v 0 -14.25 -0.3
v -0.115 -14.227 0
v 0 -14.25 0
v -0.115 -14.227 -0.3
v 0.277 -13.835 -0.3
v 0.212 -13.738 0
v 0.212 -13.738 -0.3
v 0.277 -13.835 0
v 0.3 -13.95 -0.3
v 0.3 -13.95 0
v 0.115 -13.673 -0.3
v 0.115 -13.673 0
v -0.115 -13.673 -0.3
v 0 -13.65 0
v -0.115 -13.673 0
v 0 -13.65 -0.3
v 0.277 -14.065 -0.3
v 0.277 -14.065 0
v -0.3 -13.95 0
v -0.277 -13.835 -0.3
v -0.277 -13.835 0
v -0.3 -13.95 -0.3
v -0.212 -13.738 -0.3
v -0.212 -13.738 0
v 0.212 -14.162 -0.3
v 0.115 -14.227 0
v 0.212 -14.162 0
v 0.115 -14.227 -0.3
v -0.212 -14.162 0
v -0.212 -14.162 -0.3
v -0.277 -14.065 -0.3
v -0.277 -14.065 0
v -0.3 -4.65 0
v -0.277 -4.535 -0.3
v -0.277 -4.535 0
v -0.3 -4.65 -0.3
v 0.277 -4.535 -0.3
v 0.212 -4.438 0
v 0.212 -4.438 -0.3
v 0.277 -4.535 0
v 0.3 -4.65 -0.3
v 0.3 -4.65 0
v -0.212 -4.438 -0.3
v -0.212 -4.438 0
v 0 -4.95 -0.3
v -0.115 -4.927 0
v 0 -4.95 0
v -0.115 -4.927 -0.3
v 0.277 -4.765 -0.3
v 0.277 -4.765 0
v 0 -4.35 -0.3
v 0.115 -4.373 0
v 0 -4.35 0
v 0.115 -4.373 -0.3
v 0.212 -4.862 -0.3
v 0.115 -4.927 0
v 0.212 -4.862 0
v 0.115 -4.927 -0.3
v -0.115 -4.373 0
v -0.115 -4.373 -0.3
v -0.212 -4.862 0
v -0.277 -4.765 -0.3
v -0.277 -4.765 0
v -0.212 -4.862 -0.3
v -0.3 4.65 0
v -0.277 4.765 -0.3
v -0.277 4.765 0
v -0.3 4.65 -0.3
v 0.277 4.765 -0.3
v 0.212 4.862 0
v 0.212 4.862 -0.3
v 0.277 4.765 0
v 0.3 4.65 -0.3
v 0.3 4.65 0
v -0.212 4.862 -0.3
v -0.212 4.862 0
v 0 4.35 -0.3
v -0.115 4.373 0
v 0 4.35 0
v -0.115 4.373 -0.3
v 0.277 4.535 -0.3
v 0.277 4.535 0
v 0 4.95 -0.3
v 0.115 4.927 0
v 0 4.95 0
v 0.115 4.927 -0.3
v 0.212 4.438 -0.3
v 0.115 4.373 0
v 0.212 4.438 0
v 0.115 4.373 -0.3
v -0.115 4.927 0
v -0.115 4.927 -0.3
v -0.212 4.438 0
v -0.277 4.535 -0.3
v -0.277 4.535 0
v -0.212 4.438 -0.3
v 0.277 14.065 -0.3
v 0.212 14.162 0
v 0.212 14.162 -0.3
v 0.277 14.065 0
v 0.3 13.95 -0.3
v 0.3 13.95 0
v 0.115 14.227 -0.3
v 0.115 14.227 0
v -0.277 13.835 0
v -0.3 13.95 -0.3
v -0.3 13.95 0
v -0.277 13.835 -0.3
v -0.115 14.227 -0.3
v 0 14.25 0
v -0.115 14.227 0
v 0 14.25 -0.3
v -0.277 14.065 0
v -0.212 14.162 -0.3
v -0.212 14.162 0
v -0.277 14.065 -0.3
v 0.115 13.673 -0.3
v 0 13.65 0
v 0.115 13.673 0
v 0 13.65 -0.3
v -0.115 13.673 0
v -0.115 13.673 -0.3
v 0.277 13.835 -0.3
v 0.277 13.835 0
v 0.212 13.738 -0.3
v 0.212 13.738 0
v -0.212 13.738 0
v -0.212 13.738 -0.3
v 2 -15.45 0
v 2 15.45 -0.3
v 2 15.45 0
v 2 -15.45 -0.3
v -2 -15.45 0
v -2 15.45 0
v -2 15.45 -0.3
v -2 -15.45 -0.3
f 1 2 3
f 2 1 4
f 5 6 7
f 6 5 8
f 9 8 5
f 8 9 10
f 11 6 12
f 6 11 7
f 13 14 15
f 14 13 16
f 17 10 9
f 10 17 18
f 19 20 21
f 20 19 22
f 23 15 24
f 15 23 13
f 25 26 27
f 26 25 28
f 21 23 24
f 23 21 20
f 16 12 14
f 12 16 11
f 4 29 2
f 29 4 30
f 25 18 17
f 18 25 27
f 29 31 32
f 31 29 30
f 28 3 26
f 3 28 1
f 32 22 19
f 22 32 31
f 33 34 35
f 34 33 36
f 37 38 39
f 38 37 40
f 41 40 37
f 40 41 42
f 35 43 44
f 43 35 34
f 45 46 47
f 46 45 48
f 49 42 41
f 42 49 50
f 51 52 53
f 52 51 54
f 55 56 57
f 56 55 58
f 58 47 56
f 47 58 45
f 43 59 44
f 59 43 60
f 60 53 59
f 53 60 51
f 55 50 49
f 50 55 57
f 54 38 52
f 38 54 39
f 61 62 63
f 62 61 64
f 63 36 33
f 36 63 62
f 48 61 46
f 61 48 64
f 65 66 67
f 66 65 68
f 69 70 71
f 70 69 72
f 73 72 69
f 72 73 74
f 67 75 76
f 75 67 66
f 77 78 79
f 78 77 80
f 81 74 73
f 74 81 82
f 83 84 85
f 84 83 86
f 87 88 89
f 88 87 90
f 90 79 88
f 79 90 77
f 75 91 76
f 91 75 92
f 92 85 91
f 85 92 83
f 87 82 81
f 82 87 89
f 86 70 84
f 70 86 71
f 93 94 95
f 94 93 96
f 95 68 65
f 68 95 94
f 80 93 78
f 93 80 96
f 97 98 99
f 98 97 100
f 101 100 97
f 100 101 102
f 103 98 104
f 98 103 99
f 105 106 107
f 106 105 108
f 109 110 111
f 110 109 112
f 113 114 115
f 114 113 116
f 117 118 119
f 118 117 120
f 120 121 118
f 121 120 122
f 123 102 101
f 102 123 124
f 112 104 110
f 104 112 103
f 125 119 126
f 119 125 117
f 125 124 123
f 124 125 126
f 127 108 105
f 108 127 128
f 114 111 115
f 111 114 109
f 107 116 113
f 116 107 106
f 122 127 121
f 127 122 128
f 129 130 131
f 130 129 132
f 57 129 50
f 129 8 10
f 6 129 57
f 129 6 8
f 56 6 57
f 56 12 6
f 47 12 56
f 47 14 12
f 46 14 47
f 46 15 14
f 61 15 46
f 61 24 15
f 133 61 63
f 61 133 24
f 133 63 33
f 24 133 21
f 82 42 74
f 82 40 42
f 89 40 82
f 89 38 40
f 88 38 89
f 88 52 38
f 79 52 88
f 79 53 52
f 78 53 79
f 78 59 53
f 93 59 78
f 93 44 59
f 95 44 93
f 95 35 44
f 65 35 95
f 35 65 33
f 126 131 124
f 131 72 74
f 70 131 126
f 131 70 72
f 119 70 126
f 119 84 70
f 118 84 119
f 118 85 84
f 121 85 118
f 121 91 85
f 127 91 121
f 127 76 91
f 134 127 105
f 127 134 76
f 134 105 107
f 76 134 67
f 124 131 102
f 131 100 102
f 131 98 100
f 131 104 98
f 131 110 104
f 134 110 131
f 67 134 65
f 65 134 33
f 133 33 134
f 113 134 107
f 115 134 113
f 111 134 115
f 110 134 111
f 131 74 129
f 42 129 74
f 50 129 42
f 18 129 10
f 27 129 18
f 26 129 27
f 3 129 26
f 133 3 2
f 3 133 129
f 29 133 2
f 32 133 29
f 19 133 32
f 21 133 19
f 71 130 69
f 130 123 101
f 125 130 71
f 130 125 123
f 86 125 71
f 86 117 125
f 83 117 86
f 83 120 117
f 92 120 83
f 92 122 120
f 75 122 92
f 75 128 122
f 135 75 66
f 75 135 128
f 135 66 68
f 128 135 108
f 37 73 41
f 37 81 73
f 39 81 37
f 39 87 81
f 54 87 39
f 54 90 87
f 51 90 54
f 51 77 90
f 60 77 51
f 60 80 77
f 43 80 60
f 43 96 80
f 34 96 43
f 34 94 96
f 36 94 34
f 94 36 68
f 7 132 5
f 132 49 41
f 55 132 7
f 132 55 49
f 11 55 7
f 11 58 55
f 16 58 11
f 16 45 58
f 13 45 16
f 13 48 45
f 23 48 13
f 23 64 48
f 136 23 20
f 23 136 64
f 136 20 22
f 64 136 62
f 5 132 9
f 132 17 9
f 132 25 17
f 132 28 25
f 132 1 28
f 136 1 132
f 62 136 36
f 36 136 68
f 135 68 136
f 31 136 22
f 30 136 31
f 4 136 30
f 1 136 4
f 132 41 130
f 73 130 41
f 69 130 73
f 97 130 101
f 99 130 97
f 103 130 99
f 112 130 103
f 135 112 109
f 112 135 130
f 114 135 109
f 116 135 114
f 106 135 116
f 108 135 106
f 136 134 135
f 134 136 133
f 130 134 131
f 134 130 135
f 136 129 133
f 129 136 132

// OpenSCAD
// file: hdim.scad
module hdim(x1 = 10, x2 = 20, y = 10, dimline_lenght = 9.0) 
{
    dimline_overlap = 0.5;
    dimline_width = 0.3;
    text_size = 2;
    tmp = 2*dimline_overlap+text_size/2;
    text_pos = dimline_lenght>0 ? tmp : -tmp; 
    dimline_abs = dimline_lenght>0 ? dimline_lenght : -dimline_lenght;
    
    color([0,0,0])
    {
        translate([x1,y-dimline_lenght/2,0]) 
            square([dimline_width, 
                dimline_abs + 2*dimline_overlap], 
                center=true, $fs=0.01);
                
        translate([x2,y-dimline_lenght/2,0]) 
            square([dimline_width, 
                dimline_abs + 2*dimline_overlap], 
                center=true, $fs=0.01);

        translate([(x1+x2)/2,y-dimline_lenght,0]) 
            square([x2-x1, 
                dimline_width], 
                center=true, $fs=0.01);
    }
        
    translate([(x1+x2)/2,y-dimline_lenght-text_pos,0]) 
    {
        color([0,0,0])
        cube([text_size * 5, 1.2*text_size, 0.9], center=true);
        
        color([0.8,0.8,0.5,1.0])
        {
            translate([0,0,0.2])
            text(str(0.1*round((x2-x1)*10)), size = text_size, 
                halign = "center",valign = "center");
            translate([0,0,-0.2])
            rotate([0,180,0])
            text(str(0.1*round((x2-x1)*10)), size = text_size, 
                halign = "center",valign = "center");
        }
    }
}

hdim();
// main file
use <hdim.scad> 

module ironbrace(shelf_depth = 32.3, show_dims = false)
{
    if (false) {
        anglebar_ironbrace(shelf_depth, show_dims);
    }
    else {
        flat_ironbrace(shelf_depth, show_dims);
    }
}

module flat_ironbrace(shelf_depth, show_dims = false)
{
    brace_w = 4;
    brace_t = 0.3;
    brace_d1 = 0.7;
    brace_d2 = 0.7;
    n_screw_holes = 4;
    brace_l = shelf_depth - brace_d1 - brace_d2;
    screw_end_d = 1.5;
    screw_range = brace_l - 2*screw_end_d;
    screw_step = screw_range/(n_screw_holes-1);
    first_screw = -screw_range/2;
    screw_hole_diam = 0.6;

    translate([0,(shelf_depth-brace_l)/2-brace_d1,-brace_t/2])
    difference()
    {
        color([0.23,0.12,0.10, 1.0])
        cube([brace_w, brace_l, brace_t], center=true);
        
        for (x = [0: n_screw_holes-1]) {
            xx = x * screw_step + first_screw;
            translate([0, xx, 0])
            cylinder(h=brace_t+0.5,r=screw_hole_diam/2,center = true, $fn = 16);
            
        }
    }

    if (show_dims) 
    {
        translate([0, -brace_l/2, 0])
            
        for (x = [0: n_screw_holes-1]) {
            xx = x * screw_step + first_screw;
            translate([0, 0, (xx+first_screw)/9-0.2])
            rotate([0,0,90])
            hdim(0, x * screw_step+screw_end_d, -brace_w/2 - 0.3, 4+xx/4);
        }
    }
}

module anglebar_ironbrace(shelf_depth, show_dims = false)
{
    bar_diam = 3.8;
    bar_t  = 0.3;
    
    brace_d1 = 1;
    brace_d2 = 1;
    brace_l = shelf_depth - brace_d1 - brace_d2;
    n_screw_holes = 4;
    screw_range = brace_l - 3;
    screw_step = screw_range/(n_screw_holes-1);
      
    color([0.8,0.3,0.2,1])
    {
        //difference()
        {
            union() {
                linear_extrude(bar_t) 
                polygon(points=[[0,0],
                    [bar_diam, bar_diam],
                    [brace_l-bar_diam, bar_diam],
                    [brace_l, 0], [0,0]]);
 
                cube([brace_l, bar_t, bar_diam]);
            }
            
            for (x = [0: n_screw_holes-1]) {
                translate([x * screw_step + first_screw, brace_d1/20])
                cylinder(h=brace_t+0.5,r=screw_hole_diam/2,center = true, $fn = 16);
            }
        }
    }}

ironbrace(32.3, true);
